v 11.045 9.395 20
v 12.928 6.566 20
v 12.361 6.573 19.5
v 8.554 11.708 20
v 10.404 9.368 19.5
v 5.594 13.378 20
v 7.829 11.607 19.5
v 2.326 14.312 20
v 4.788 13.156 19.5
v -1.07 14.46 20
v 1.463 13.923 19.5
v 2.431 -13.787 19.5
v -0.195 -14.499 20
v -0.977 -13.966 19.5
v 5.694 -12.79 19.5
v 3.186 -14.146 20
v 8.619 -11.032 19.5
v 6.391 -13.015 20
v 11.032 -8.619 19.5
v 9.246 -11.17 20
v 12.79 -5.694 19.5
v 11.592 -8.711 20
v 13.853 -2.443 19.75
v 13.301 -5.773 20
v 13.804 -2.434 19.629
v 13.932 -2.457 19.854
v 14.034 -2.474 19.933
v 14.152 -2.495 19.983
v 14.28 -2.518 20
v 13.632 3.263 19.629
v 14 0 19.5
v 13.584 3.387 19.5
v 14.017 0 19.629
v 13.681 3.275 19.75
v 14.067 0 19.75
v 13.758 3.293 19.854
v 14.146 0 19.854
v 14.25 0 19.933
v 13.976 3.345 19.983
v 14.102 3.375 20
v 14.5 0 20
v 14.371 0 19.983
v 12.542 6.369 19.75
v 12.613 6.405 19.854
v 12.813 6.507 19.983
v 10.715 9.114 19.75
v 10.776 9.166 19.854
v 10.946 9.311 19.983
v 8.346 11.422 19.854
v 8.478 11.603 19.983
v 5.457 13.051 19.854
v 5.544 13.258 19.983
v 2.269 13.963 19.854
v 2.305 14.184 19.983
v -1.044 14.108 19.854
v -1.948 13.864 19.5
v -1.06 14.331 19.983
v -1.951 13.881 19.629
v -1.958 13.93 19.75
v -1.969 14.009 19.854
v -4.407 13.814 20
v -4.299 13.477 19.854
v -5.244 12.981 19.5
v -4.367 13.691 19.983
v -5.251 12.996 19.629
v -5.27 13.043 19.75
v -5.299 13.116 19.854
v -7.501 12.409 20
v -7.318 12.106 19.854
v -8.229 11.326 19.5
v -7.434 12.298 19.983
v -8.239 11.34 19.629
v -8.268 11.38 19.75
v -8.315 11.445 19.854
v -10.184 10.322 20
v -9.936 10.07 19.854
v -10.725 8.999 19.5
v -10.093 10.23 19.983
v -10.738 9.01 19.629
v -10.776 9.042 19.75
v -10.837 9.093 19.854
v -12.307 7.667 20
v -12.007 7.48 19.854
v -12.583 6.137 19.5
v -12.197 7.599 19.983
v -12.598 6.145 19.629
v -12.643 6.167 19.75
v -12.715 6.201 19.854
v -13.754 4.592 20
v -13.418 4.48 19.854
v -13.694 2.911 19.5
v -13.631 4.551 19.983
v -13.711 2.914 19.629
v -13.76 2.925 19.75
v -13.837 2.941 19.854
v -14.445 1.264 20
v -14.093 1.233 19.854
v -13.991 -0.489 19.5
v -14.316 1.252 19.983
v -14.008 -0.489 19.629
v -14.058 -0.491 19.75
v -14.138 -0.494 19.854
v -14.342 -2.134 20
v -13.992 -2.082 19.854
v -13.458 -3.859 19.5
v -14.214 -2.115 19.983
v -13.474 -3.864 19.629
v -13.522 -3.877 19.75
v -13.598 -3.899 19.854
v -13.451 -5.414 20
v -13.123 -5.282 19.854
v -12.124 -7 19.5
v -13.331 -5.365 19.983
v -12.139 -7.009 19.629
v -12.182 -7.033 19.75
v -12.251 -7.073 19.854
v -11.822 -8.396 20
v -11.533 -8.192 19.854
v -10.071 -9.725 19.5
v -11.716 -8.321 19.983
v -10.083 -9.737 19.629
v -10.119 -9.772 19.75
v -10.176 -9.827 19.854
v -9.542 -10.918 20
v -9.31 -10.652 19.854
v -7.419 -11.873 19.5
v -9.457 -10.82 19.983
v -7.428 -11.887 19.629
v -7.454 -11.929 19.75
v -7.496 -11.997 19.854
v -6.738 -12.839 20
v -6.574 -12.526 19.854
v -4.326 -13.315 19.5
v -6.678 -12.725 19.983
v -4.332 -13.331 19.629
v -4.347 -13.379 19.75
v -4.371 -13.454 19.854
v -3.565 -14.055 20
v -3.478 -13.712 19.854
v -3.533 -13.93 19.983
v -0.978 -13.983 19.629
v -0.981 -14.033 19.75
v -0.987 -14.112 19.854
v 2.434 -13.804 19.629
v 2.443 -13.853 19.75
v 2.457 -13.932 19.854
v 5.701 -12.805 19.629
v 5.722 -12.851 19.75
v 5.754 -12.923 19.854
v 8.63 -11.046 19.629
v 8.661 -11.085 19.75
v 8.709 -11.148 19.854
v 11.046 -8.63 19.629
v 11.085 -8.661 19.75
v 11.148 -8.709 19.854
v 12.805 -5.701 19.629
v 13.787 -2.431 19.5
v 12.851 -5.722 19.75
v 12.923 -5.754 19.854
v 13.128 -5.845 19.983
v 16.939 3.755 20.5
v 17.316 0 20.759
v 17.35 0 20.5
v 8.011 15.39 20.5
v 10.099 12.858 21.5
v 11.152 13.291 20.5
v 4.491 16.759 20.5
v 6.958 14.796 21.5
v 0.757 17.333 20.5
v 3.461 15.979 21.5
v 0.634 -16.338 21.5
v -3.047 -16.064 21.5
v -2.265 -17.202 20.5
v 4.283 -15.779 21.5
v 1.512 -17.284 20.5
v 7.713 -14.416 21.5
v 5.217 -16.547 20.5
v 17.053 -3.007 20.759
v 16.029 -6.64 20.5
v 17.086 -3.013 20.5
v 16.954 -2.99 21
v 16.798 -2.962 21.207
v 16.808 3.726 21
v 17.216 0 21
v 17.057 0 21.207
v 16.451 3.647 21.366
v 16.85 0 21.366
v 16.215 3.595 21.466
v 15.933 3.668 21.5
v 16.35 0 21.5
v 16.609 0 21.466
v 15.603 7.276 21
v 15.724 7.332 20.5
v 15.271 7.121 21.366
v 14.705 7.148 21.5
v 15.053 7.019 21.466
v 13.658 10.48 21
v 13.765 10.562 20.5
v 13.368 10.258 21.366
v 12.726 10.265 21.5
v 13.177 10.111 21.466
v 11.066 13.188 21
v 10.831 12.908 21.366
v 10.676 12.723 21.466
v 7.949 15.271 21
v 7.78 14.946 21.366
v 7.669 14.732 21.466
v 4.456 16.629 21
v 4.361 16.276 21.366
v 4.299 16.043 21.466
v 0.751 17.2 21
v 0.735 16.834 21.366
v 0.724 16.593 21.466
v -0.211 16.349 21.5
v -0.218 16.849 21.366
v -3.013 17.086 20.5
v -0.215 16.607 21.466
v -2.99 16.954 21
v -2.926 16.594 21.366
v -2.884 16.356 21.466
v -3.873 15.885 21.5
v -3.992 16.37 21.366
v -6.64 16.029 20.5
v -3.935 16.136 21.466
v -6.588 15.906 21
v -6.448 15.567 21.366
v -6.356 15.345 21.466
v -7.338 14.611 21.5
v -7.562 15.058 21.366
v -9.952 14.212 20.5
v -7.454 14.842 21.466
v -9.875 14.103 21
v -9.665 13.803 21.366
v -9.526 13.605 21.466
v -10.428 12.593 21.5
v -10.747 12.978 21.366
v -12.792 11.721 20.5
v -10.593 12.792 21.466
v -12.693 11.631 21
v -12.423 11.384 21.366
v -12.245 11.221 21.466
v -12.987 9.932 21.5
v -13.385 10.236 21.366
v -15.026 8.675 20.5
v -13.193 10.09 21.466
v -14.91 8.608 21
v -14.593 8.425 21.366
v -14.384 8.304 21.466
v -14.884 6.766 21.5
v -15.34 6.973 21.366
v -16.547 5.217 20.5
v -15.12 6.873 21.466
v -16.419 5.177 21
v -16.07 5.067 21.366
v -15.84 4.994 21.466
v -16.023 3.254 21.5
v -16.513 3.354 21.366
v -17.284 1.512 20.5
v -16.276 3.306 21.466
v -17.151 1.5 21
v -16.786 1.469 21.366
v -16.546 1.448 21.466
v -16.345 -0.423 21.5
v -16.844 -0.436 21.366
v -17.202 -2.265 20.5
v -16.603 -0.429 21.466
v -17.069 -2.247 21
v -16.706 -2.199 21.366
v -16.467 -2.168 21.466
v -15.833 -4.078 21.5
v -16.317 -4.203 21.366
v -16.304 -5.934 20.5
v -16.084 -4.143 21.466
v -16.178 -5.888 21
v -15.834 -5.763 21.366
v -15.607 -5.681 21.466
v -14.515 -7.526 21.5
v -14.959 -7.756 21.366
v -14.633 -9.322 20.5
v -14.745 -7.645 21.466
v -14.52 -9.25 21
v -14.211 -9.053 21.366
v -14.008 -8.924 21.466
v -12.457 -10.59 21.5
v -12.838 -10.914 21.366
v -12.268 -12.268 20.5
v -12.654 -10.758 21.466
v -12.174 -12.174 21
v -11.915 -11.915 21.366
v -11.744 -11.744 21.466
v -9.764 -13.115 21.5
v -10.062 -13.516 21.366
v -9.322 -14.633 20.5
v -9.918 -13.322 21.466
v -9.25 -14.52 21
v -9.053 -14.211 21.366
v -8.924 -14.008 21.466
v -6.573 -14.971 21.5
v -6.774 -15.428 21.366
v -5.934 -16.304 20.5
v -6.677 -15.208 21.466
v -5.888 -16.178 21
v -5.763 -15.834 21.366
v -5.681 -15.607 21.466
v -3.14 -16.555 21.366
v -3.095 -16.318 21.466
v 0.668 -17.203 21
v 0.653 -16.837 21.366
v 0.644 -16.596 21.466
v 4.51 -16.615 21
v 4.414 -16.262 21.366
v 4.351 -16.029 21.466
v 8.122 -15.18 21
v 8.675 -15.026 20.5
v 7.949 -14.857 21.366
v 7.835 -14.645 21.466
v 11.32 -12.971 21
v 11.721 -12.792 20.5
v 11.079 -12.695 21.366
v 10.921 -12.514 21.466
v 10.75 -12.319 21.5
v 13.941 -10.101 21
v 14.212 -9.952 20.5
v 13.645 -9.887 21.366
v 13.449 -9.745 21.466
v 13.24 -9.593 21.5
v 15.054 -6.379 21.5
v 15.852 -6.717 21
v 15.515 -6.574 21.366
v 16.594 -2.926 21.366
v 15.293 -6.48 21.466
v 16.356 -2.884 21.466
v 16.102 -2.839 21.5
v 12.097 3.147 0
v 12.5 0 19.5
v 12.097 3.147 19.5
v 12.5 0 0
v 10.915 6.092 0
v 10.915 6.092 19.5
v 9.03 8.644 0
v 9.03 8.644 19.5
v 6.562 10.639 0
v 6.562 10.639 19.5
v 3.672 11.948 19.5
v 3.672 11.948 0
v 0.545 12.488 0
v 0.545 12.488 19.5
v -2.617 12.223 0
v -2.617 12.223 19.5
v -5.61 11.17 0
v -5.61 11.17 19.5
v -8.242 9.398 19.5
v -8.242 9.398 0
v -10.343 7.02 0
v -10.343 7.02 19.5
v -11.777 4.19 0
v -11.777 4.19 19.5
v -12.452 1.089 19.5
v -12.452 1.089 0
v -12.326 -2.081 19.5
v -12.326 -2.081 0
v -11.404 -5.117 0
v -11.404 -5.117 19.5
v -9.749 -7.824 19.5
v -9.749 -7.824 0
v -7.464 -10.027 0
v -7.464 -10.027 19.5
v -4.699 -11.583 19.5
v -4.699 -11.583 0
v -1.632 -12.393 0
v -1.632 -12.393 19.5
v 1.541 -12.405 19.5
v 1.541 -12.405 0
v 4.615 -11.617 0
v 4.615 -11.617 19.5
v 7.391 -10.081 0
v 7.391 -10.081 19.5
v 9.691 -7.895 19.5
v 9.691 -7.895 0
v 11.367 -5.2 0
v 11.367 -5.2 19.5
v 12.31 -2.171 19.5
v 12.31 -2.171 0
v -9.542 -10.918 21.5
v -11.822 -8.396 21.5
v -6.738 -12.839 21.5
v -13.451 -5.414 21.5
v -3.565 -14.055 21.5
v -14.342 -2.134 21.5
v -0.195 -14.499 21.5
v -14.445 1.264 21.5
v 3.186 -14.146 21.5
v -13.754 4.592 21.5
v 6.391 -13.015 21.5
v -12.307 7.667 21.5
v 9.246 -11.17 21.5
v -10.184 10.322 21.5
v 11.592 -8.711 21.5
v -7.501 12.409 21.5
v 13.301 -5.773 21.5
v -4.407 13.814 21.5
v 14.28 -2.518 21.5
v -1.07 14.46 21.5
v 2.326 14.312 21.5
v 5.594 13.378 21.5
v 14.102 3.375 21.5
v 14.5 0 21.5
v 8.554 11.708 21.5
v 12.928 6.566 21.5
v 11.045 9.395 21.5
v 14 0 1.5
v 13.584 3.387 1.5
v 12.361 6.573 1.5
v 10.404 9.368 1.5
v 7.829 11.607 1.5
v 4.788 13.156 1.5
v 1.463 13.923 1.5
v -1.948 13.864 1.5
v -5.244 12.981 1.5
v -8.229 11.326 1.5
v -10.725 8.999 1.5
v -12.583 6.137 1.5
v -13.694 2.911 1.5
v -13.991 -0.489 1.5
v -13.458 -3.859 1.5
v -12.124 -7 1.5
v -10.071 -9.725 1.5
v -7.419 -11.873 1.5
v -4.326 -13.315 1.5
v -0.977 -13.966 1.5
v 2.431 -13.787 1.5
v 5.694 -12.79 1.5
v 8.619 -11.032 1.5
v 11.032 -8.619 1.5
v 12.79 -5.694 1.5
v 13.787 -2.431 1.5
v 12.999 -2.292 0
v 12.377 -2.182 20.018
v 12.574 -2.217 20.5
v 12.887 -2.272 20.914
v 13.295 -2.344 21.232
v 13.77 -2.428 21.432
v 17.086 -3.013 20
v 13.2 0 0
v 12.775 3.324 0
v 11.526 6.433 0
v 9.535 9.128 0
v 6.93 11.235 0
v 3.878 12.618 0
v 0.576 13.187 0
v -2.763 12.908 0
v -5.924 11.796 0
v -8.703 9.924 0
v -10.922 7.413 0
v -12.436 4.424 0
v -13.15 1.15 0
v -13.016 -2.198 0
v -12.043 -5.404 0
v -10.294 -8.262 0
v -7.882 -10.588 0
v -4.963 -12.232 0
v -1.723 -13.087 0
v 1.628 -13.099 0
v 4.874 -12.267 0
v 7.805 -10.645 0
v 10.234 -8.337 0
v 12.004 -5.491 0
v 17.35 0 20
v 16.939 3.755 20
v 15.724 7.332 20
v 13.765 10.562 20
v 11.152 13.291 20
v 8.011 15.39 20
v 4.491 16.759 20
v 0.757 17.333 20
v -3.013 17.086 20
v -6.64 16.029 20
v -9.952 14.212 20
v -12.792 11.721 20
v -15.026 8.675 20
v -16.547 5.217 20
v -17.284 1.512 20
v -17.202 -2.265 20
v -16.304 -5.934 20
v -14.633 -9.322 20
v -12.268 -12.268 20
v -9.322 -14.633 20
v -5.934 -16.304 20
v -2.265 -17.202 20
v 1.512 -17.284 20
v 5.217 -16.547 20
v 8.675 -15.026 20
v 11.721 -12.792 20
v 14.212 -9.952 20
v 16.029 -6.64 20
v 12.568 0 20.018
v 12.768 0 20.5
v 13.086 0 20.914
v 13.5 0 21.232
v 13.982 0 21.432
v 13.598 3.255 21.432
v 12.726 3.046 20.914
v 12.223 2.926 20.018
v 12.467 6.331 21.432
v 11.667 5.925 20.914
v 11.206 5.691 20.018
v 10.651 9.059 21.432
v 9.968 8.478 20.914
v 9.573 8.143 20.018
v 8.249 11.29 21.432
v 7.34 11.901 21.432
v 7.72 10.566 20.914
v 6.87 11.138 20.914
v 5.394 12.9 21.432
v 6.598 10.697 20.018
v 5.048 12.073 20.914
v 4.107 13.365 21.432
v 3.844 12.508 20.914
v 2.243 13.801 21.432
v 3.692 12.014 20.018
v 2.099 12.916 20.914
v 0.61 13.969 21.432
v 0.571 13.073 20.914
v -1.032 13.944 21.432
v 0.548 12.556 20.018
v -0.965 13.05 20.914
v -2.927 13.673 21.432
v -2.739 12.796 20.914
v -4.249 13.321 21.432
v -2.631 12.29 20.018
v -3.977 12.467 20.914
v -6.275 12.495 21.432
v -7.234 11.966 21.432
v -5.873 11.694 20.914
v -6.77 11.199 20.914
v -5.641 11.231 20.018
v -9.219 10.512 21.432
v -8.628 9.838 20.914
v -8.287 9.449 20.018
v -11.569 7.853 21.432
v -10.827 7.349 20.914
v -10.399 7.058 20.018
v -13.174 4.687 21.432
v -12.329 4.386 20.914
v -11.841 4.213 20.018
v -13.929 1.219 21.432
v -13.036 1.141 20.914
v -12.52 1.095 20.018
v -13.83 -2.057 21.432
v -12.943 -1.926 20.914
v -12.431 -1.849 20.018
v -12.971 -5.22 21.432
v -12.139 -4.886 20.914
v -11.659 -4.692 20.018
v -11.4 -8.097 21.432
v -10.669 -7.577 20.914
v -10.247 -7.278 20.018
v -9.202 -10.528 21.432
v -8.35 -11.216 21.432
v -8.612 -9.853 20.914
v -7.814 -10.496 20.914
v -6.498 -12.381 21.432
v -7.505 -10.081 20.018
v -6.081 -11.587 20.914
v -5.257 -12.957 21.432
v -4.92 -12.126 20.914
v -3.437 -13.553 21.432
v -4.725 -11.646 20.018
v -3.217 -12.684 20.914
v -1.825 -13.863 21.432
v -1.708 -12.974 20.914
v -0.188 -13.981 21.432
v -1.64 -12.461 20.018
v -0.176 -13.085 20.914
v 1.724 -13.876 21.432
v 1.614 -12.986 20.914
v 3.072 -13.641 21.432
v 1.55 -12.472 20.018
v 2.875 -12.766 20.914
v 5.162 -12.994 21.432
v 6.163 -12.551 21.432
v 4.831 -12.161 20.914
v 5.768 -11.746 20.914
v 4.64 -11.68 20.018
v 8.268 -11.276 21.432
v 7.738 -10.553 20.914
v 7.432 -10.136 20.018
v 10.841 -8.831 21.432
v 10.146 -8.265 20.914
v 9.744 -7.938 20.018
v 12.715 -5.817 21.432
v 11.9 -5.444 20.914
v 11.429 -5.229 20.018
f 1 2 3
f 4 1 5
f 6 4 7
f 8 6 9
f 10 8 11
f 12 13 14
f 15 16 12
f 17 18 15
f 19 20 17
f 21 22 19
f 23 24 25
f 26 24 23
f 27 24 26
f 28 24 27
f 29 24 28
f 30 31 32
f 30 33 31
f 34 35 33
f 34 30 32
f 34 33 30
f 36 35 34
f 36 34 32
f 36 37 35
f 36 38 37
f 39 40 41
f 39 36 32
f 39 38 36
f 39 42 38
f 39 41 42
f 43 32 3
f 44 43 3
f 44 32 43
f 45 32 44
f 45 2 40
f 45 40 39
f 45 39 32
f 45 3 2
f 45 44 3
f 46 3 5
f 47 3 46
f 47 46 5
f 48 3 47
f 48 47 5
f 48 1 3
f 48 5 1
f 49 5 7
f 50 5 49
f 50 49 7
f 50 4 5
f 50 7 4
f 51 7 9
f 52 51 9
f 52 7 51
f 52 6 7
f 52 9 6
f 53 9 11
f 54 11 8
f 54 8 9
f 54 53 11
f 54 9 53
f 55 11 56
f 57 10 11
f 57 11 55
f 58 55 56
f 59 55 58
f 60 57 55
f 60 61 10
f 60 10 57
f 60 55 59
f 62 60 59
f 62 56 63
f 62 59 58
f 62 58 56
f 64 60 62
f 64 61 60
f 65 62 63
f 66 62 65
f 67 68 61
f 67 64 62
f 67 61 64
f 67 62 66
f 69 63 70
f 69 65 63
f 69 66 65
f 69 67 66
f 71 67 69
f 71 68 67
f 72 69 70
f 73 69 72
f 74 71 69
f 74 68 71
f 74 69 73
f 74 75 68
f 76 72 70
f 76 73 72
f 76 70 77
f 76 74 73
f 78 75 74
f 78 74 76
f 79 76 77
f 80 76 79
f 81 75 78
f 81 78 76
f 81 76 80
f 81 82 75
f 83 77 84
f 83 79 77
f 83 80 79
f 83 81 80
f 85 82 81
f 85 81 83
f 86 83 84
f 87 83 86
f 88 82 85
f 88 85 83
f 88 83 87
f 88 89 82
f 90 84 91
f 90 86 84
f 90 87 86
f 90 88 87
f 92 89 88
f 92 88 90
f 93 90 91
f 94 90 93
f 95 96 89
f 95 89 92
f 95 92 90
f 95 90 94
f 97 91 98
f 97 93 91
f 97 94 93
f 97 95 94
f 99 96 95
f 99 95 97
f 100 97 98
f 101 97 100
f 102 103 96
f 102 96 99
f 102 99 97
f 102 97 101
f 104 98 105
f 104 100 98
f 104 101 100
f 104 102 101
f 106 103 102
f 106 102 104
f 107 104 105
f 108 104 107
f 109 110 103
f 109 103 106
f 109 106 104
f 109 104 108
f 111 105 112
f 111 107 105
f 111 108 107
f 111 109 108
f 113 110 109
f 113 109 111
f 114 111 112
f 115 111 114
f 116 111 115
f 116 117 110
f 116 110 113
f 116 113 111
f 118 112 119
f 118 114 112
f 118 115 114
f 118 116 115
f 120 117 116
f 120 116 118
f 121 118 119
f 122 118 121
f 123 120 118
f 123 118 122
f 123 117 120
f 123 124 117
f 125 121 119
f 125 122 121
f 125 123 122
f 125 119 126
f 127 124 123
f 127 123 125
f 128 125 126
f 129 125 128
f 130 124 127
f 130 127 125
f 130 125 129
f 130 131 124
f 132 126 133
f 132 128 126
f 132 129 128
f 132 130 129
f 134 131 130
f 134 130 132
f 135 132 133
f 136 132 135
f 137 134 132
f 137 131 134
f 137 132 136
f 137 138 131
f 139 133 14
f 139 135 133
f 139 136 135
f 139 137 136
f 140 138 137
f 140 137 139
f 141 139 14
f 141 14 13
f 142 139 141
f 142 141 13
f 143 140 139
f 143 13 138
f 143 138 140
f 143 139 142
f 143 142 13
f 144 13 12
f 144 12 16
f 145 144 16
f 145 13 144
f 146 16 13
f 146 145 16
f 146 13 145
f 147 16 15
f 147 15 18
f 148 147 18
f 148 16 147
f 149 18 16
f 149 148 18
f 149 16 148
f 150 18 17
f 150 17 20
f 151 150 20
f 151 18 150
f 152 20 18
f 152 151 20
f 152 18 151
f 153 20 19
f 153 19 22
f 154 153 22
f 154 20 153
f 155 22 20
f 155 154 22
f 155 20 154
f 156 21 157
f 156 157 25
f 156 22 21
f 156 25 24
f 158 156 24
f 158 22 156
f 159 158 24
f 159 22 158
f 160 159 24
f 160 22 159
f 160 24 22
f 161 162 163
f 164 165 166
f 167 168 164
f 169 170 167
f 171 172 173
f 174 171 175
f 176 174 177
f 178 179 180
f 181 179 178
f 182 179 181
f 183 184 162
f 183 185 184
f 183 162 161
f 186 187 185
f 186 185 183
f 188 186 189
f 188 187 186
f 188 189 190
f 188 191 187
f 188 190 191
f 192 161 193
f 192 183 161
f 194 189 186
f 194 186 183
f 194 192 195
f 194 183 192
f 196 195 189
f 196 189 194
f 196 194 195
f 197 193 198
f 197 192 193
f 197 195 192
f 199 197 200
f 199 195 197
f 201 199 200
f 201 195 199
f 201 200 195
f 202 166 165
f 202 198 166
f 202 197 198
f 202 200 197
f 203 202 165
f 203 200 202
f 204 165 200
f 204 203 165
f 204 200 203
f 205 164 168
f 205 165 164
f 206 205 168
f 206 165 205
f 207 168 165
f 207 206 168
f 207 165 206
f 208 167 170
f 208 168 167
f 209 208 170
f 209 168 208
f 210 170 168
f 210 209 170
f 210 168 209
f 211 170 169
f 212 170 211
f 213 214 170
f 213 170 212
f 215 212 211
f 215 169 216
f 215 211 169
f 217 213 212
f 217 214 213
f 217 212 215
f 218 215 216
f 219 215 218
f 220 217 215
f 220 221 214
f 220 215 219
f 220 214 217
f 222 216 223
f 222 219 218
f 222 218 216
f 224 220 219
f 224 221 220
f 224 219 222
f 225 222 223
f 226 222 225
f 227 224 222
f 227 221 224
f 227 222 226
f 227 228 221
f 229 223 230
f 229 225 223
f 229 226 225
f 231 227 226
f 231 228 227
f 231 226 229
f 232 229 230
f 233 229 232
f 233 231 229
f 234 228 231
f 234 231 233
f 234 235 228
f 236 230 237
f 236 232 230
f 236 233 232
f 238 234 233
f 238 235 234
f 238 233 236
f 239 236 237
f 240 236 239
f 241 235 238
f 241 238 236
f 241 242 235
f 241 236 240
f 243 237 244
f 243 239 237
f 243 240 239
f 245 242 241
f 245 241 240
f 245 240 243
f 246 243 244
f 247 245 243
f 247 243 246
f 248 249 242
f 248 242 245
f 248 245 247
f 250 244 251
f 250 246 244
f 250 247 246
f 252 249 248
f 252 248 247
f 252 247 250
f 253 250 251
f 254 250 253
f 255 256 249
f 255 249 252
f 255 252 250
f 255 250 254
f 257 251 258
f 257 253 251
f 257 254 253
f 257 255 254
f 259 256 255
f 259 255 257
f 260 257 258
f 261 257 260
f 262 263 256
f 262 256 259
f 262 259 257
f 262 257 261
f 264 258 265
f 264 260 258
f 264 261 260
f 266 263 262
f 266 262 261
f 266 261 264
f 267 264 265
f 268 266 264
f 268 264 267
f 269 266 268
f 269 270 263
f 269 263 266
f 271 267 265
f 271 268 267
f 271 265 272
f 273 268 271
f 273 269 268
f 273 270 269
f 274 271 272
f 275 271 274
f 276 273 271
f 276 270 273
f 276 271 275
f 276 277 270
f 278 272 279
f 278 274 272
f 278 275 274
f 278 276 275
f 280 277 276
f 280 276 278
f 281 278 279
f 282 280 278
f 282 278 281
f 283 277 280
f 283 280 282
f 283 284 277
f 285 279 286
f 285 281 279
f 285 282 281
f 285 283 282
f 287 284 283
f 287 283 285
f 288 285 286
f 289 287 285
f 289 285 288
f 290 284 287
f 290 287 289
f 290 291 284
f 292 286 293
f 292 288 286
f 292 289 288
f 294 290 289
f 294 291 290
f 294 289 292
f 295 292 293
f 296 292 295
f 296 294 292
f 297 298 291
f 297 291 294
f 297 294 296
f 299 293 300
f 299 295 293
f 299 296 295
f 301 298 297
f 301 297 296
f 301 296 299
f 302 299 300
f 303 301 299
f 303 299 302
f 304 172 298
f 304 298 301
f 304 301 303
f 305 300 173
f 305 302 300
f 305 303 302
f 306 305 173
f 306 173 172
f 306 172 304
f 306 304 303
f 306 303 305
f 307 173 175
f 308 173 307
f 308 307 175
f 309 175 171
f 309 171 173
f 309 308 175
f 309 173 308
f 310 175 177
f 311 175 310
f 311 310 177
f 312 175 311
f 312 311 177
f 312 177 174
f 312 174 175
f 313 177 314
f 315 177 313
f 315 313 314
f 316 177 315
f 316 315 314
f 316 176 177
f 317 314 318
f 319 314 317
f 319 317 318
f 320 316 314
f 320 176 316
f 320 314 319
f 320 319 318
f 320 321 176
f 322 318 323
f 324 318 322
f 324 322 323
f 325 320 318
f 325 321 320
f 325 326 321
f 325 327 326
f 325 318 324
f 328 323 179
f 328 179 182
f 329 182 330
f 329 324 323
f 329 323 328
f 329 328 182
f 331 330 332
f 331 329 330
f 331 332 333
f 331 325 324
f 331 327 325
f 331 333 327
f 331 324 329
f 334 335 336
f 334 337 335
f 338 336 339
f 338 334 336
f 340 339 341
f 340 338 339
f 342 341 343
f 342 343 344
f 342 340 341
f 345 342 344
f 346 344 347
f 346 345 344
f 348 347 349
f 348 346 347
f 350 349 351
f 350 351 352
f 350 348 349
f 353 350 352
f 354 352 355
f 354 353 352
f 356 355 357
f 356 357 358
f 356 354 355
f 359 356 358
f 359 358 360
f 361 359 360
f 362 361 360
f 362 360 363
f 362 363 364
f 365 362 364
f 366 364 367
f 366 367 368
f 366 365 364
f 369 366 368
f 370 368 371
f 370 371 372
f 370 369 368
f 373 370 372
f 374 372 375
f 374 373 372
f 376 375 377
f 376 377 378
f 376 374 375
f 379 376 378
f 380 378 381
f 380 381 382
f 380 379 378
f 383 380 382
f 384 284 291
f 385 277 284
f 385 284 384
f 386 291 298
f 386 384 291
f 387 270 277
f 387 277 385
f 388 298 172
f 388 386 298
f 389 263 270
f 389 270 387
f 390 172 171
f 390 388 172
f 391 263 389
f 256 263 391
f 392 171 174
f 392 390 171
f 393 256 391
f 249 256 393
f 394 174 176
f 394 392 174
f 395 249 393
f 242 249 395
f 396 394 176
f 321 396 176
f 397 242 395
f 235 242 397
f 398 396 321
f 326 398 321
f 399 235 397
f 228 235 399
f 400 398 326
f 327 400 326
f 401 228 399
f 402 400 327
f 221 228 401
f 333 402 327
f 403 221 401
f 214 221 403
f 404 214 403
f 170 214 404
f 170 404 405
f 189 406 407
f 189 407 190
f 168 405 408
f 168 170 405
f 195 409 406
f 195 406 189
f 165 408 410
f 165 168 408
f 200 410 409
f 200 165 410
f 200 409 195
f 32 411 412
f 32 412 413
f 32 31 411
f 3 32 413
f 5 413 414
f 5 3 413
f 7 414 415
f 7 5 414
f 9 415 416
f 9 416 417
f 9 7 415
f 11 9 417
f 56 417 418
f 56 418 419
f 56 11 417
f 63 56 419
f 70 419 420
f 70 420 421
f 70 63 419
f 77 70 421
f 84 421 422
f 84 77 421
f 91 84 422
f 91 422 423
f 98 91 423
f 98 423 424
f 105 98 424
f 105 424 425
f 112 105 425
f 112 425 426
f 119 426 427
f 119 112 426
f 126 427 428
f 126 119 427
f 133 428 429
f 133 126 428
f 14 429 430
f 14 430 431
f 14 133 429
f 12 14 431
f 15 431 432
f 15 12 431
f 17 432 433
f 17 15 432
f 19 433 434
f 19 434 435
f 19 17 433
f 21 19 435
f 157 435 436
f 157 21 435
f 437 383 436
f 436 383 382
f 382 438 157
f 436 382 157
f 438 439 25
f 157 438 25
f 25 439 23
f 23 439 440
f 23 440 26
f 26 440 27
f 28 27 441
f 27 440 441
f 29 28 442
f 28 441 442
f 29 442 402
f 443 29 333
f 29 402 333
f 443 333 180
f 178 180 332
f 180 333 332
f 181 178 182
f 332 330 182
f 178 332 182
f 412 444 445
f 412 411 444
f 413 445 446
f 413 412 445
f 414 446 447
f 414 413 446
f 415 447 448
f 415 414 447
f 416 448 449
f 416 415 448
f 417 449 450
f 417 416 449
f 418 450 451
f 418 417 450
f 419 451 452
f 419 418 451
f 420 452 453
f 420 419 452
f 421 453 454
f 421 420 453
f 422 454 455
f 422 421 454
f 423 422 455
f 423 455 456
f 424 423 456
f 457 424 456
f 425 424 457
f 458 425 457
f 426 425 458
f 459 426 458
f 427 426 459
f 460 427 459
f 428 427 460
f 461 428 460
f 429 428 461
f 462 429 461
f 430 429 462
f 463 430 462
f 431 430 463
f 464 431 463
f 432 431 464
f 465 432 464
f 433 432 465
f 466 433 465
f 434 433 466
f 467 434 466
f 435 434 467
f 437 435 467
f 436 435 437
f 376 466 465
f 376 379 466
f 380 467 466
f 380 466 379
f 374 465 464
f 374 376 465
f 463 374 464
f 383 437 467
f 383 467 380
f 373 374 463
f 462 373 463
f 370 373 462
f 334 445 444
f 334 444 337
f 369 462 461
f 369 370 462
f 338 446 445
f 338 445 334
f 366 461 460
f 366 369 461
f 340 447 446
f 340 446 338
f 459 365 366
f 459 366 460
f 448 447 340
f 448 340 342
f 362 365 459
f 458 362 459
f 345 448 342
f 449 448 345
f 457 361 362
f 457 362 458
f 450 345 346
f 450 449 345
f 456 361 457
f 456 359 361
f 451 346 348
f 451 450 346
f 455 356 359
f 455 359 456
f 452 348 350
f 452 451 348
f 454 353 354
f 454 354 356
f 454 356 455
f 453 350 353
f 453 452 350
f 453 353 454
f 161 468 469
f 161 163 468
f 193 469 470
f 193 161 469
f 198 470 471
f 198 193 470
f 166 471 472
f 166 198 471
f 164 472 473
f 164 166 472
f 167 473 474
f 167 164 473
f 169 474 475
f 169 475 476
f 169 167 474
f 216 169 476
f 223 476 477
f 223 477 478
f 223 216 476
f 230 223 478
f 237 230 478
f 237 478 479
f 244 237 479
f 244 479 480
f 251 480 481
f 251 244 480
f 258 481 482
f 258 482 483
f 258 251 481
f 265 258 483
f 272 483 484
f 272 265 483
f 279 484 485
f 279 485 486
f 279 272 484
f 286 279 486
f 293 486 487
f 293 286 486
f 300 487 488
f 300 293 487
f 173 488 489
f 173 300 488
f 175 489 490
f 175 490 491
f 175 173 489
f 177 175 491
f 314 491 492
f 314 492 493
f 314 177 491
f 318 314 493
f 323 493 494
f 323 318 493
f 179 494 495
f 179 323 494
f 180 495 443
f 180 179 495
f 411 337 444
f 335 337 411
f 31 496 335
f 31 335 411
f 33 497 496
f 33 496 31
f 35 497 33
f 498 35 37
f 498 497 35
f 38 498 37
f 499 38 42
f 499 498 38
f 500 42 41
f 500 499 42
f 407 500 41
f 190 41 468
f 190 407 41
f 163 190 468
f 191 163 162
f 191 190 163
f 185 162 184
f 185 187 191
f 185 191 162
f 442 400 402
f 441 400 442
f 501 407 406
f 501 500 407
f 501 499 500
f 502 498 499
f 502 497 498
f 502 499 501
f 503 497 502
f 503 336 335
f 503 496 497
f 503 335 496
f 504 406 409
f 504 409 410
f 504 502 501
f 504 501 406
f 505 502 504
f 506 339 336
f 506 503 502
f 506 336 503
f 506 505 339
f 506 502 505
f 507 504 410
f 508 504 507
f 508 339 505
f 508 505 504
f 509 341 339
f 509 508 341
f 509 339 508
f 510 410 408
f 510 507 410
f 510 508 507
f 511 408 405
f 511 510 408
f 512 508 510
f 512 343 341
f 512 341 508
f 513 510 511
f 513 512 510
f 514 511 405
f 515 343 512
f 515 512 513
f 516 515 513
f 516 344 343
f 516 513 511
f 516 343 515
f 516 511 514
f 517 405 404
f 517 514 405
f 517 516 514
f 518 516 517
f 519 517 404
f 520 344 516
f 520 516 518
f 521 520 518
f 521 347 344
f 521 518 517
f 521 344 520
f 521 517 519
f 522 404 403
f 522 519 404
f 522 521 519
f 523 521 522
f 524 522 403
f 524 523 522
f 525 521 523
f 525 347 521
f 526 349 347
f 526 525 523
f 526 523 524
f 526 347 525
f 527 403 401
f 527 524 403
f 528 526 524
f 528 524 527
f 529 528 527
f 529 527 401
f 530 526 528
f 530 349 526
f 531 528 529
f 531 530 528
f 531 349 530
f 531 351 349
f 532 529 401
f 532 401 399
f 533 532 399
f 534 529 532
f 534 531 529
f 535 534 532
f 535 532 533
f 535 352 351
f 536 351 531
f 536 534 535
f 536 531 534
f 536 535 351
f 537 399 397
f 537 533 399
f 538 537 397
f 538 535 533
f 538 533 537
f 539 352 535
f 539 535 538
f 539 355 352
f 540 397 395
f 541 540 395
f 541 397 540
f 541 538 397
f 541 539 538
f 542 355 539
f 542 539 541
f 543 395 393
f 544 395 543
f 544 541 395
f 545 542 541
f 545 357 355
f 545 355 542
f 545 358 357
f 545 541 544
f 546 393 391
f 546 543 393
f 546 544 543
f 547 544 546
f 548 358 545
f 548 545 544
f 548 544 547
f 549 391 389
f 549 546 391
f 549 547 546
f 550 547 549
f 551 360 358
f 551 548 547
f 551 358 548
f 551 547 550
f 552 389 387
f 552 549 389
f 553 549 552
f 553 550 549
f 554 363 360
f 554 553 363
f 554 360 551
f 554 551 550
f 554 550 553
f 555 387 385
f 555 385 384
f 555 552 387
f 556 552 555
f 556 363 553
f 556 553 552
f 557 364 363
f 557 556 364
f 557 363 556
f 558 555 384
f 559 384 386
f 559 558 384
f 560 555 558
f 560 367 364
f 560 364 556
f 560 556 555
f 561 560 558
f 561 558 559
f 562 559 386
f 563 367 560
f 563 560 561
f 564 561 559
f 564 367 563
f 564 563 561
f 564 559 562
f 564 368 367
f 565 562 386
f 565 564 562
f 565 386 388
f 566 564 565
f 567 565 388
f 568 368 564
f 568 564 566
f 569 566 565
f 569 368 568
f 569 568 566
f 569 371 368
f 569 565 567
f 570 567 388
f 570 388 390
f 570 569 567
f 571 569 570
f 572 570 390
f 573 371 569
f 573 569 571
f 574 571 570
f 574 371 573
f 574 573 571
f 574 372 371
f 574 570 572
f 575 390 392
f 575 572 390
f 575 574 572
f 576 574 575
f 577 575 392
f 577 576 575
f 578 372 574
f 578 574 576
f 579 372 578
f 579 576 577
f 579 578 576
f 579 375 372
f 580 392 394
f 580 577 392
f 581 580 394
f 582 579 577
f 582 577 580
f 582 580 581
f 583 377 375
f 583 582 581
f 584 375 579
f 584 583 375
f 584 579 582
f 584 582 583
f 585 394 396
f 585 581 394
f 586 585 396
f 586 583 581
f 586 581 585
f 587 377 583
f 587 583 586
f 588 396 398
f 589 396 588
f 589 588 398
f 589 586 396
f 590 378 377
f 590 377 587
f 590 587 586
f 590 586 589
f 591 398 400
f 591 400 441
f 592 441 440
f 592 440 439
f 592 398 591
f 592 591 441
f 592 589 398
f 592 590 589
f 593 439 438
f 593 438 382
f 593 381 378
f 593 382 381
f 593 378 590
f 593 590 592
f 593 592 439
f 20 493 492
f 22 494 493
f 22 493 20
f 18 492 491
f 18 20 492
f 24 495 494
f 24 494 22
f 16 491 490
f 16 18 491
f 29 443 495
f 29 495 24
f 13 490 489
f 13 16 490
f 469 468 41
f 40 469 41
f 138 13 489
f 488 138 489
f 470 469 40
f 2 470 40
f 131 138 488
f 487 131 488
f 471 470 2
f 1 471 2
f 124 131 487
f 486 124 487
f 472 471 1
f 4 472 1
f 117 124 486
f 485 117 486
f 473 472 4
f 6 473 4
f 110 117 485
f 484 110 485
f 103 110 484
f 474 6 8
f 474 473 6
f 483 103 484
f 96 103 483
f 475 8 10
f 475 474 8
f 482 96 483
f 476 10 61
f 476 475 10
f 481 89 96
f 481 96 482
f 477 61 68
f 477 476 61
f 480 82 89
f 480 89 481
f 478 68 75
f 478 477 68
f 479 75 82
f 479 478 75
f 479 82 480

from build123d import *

# Parameters (mm, degrees)
F1_ANGLE = 350


with BuildPart() as f1:
    # F0 (on Front) → F1 (revolve)
    with BuildSketch(Plane.XZ):
        with BuildLine():
            Line((12.5, 19.5), (12.5, 0))
            Line((12.5, 0), (13.2, 0))
            Line((13.2, 0), (14, 1.5))
            Line((14, 1.5), (14, 19.5))
            ThreePointArc((14, 19.5), (14.146447, 19.853553), (14.5, 20))
            Line((14.5, 20), (17.35, 20))
            Line((17.35, 20), (17.35, 20.5))
            ThreePointArc((17.35, 20.5), (17.057107, 21.207107), (16.35, 21.5))
            Line((16.35, 21.5), (14.5, 21.5))
            ThreePointArc((14.5, 21.5), (13.085786, 20.914214), (12.5, 19.5))
        make_face()
    revolve(axis=Axis((0, 0, 24.386095), (0, 0, 1)), revolution_arc=F1_ANGLE)


solid = f1.part
